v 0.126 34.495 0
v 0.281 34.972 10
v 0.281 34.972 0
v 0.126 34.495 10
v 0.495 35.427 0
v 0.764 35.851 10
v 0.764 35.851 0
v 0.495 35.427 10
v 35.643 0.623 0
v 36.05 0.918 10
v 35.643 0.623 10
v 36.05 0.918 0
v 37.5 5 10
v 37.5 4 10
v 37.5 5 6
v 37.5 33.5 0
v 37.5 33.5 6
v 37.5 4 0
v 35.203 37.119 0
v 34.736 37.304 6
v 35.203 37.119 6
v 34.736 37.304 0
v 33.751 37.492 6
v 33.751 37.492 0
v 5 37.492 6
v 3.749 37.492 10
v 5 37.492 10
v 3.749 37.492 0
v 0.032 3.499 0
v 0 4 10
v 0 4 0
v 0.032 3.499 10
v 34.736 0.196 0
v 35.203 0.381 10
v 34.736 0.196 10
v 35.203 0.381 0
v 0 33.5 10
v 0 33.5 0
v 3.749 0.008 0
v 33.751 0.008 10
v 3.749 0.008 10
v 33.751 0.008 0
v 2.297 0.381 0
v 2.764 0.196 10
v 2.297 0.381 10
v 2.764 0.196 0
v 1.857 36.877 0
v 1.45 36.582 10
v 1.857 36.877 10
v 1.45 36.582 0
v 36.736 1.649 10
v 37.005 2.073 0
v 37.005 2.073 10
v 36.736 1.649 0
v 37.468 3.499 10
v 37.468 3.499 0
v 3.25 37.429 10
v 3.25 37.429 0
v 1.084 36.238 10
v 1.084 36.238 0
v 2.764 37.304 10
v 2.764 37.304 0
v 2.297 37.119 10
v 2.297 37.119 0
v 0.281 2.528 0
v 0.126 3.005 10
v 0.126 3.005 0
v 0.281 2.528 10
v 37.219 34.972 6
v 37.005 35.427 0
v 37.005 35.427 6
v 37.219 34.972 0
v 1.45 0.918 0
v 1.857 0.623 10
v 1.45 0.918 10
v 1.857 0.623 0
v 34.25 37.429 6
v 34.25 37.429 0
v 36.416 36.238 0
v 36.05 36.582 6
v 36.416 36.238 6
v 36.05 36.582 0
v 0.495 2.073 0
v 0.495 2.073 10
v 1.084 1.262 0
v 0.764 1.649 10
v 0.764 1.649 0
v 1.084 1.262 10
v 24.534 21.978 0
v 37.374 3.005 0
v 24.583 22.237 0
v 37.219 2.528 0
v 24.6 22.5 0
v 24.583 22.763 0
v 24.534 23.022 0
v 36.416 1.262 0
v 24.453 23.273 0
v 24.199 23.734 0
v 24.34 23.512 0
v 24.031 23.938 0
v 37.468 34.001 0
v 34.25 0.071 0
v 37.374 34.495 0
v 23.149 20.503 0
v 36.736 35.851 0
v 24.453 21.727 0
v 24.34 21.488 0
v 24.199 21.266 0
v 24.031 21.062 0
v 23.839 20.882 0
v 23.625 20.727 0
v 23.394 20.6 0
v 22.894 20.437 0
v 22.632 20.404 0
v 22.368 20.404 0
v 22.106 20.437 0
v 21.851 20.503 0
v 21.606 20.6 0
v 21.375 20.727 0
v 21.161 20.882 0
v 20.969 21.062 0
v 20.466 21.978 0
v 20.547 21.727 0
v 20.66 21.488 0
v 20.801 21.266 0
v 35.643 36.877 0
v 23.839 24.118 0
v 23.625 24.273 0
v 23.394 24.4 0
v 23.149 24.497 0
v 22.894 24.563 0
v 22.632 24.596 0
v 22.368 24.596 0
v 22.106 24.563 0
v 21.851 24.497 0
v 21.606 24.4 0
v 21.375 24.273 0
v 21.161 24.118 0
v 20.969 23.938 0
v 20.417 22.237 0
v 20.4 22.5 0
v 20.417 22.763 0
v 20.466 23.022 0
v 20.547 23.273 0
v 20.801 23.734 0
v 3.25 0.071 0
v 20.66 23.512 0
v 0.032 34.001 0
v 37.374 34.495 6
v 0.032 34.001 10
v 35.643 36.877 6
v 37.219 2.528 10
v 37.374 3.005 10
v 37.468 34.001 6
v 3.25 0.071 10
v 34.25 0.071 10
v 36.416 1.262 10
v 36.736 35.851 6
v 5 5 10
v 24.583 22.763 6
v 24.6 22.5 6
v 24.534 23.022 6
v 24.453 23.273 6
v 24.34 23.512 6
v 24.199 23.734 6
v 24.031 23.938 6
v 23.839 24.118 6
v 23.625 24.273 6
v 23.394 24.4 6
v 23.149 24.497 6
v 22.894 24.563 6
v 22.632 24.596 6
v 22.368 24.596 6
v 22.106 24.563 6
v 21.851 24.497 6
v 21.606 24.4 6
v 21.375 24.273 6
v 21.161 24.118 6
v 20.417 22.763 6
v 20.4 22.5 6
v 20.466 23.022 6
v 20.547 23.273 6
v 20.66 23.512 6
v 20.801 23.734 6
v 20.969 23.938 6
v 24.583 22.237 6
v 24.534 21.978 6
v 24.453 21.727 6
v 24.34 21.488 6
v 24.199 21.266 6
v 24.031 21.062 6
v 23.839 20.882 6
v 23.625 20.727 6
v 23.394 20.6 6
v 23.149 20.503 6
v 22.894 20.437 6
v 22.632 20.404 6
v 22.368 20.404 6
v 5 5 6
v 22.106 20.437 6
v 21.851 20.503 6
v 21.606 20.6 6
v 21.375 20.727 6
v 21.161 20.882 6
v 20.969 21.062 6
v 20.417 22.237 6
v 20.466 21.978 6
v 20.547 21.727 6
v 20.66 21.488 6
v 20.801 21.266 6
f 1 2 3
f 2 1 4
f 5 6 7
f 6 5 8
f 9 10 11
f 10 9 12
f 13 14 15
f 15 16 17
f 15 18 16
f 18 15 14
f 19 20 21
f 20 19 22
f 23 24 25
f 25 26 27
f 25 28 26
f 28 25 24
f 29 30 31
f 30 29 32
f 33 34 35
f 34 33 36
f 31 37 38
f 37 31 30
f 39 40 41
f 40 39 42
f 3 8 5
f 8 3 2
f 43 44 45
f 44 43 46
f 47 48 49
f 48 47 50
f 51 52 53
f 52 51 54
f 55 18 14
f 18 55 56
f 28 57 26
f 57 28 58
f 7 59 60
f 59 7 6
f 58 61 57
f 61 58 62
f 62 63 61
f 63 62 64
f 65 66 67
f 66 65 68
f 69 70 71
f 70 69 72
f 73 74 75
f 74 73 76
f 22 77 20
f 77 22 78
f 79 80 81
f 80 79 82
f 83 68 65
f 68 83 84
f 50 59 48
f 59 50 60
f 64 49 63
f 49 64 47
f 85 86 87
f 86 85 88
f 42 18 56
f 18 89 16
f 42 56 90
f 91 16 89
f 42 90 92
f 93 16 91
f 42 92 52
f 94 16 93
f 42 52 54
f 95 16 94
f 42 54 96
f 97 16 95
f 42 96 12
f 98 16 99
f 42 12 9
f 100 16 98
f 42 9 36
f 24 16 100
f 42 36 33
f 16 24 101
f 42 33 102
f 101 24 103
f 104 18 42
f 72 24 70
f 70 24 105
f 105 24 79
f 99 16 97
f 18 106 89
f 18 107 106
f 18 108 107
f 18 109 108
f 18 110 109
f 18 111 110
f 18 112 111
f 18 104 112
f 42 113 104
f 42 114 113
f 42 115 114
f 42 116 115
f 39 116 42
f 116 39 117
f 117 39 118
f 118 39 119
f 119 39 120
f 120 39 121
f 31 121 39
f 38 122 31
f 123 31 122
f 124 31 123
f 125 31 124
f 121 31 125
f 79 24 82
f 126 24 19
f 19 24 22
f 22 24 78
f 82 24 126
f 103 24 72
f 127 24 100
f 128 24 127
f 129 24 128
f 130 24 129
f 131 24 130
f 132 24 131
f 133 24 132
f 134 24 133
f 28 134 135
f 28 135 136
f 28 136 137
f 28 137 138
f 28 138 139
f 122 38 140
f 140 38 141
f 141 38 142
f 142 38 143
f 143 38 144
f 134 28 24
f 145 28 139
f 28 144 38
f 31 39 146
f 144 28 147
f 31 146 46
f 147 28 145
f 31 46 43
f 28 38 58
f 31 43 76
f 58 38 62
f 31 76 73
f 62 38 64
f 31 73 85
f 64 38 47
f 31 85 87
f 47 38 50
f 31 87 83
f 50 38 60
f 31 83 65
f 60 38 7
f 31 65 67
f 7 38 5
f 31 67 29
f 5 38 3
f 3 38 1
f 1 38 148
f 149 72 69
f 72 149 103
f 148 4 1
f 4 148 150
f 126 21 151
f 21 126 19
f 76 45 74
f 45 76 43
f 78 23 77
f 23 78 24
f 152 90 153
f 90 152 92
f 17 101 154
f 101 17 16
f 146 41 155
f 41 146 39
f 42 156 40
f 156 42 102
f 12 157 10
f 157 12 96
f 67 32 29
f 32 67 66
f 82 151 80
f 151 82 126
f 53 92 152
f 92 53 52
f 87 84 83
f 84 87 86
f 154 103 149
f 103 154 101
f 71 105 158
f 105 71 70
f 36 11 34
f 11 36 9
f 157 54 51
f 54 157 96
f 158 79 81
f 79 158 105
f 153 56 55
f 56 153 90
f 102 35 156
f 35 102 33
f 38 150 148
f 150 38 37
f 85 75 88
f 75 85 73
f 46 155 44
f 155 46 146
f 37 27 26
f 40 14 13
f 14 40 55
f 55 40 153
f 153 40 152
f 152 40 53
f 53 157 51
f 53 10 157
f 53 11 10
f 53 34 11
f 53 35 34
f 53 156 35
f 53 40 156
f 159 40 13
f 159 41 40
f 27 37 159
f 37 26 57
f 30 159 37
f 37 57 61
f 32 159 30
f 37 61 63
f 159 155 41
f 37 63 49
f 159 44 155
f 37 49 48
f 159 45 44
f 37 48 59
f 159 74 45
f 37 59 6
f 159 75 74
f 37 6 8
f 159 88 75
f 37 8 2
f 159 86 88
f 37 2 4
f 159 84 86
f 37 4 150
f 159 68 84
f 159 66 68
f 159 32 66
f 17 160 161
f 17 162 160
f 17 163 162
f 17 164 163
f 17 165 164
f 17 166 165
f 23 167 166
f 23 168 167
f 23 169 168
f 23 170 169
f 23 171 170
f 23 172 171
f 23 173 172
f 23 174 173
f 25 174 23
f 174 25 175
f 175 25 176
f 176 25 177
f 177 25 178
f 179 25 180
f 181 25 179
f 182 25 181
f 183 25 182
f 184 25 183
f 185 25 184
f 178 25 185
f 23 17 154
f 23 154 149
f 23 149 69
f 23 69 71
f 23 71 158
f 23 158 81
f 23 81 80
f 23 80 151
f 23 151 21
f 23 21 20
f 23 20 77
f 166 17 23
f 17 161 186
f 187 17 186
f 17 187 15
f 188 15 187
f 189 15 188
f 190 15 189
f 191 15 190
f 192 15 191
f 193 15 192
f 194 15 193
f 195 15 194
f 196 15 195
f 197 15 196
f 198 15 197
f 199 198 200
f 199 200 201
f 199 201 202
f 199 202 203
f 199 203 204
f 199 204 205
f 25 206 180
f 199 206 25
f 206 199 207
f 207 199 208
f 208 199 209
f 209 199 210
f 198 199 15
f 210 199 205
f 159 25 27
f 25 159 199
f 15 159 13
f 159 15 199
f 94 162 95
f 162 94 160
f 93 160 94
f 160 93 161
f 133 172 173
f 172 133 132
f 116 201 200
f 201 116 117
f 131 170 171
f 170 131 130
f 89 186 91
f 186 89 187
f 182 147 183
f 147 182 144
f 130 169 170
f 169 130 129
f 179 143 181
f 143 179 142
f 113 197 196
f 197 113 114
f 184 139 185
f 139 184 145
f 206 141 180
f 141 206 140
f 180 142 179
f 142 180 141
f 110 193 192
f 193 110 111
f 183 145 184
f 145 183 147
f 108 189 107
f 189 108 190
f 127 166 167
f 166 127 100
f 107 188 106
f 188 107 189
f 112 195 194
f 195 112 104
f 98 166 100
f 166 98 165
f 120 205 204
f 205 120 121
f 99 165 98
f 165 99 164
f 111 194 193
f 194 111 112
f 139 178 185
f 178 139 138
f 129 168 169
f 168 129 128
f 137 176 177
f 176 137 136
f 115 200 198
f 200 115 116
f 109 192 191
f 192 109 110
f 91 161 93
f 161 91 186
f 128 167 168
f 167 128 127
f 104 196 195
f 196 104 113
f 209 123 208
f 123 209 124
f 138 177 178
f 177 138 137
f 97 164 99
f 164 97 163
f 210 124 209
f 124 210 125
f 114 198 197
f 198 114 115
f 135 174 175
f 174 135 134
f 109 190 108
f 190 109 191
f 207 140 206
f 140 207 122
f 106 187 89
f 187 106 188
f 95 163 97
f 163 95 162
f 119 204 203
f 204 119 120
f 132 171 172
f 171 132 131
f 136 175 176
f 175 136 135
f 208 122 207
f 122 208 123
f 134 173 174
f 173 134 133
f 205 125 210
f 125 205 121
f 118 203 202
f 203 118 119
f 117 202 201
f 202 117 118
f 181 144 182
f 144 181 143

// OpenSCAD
module drilling_guide(
  hole_from_edge = 17.5,
  hole_diameter = 4.2,
  lip_size = 5
) {
  bottom_plate_thickness = 4;
  drilling_bore_depth = 10;
  guide_size = hole_from_edge + 15;
  fillet_radius = 4;

  difference() {
    x_size = guide_size + lip_size;
    y_size = guide_size + lip_size;
    hull() {
      translate([fillet_radius, fillet_radius, 0])
      cylinder(h = drilling_bore_depth, r = fillet_radius, $fn = 50);
      translate([x_size - fillet_radius, fillet_radius, 0])
      cylinder(h = drilling_bore_depth, r = fillet_radius, $fn = 50);
      translate([fillet_radius, y_size - fillet_radius, 0])
      cylinder(h = drilling_bore_depth, r = fillet_radius, $fn = 50);
      translate([x_size - fillet_radius, y_size - fillet_radius, 0])
      cylinder(h = drilling_bore_depth, r = fillet_radius, $fn = 50);
    }

    // Stepped pocket (leaves bottom_plate_thickness at bottom)
    translate([lip_size, lip_size, drilling_bore_depth - bottom_plate_thickness])
      cube([guide_size, guide_size, bottom_plate_thickness + 1]);

    // Drill guide hole
    translate([hole_from_edge + lip_size, hole_from_edge + lip_size, -1])
      cylinder(d = hole_diameter, h = drilling_bore_depth + 2, $fn = 50);
  }
}

drilling_guide();
